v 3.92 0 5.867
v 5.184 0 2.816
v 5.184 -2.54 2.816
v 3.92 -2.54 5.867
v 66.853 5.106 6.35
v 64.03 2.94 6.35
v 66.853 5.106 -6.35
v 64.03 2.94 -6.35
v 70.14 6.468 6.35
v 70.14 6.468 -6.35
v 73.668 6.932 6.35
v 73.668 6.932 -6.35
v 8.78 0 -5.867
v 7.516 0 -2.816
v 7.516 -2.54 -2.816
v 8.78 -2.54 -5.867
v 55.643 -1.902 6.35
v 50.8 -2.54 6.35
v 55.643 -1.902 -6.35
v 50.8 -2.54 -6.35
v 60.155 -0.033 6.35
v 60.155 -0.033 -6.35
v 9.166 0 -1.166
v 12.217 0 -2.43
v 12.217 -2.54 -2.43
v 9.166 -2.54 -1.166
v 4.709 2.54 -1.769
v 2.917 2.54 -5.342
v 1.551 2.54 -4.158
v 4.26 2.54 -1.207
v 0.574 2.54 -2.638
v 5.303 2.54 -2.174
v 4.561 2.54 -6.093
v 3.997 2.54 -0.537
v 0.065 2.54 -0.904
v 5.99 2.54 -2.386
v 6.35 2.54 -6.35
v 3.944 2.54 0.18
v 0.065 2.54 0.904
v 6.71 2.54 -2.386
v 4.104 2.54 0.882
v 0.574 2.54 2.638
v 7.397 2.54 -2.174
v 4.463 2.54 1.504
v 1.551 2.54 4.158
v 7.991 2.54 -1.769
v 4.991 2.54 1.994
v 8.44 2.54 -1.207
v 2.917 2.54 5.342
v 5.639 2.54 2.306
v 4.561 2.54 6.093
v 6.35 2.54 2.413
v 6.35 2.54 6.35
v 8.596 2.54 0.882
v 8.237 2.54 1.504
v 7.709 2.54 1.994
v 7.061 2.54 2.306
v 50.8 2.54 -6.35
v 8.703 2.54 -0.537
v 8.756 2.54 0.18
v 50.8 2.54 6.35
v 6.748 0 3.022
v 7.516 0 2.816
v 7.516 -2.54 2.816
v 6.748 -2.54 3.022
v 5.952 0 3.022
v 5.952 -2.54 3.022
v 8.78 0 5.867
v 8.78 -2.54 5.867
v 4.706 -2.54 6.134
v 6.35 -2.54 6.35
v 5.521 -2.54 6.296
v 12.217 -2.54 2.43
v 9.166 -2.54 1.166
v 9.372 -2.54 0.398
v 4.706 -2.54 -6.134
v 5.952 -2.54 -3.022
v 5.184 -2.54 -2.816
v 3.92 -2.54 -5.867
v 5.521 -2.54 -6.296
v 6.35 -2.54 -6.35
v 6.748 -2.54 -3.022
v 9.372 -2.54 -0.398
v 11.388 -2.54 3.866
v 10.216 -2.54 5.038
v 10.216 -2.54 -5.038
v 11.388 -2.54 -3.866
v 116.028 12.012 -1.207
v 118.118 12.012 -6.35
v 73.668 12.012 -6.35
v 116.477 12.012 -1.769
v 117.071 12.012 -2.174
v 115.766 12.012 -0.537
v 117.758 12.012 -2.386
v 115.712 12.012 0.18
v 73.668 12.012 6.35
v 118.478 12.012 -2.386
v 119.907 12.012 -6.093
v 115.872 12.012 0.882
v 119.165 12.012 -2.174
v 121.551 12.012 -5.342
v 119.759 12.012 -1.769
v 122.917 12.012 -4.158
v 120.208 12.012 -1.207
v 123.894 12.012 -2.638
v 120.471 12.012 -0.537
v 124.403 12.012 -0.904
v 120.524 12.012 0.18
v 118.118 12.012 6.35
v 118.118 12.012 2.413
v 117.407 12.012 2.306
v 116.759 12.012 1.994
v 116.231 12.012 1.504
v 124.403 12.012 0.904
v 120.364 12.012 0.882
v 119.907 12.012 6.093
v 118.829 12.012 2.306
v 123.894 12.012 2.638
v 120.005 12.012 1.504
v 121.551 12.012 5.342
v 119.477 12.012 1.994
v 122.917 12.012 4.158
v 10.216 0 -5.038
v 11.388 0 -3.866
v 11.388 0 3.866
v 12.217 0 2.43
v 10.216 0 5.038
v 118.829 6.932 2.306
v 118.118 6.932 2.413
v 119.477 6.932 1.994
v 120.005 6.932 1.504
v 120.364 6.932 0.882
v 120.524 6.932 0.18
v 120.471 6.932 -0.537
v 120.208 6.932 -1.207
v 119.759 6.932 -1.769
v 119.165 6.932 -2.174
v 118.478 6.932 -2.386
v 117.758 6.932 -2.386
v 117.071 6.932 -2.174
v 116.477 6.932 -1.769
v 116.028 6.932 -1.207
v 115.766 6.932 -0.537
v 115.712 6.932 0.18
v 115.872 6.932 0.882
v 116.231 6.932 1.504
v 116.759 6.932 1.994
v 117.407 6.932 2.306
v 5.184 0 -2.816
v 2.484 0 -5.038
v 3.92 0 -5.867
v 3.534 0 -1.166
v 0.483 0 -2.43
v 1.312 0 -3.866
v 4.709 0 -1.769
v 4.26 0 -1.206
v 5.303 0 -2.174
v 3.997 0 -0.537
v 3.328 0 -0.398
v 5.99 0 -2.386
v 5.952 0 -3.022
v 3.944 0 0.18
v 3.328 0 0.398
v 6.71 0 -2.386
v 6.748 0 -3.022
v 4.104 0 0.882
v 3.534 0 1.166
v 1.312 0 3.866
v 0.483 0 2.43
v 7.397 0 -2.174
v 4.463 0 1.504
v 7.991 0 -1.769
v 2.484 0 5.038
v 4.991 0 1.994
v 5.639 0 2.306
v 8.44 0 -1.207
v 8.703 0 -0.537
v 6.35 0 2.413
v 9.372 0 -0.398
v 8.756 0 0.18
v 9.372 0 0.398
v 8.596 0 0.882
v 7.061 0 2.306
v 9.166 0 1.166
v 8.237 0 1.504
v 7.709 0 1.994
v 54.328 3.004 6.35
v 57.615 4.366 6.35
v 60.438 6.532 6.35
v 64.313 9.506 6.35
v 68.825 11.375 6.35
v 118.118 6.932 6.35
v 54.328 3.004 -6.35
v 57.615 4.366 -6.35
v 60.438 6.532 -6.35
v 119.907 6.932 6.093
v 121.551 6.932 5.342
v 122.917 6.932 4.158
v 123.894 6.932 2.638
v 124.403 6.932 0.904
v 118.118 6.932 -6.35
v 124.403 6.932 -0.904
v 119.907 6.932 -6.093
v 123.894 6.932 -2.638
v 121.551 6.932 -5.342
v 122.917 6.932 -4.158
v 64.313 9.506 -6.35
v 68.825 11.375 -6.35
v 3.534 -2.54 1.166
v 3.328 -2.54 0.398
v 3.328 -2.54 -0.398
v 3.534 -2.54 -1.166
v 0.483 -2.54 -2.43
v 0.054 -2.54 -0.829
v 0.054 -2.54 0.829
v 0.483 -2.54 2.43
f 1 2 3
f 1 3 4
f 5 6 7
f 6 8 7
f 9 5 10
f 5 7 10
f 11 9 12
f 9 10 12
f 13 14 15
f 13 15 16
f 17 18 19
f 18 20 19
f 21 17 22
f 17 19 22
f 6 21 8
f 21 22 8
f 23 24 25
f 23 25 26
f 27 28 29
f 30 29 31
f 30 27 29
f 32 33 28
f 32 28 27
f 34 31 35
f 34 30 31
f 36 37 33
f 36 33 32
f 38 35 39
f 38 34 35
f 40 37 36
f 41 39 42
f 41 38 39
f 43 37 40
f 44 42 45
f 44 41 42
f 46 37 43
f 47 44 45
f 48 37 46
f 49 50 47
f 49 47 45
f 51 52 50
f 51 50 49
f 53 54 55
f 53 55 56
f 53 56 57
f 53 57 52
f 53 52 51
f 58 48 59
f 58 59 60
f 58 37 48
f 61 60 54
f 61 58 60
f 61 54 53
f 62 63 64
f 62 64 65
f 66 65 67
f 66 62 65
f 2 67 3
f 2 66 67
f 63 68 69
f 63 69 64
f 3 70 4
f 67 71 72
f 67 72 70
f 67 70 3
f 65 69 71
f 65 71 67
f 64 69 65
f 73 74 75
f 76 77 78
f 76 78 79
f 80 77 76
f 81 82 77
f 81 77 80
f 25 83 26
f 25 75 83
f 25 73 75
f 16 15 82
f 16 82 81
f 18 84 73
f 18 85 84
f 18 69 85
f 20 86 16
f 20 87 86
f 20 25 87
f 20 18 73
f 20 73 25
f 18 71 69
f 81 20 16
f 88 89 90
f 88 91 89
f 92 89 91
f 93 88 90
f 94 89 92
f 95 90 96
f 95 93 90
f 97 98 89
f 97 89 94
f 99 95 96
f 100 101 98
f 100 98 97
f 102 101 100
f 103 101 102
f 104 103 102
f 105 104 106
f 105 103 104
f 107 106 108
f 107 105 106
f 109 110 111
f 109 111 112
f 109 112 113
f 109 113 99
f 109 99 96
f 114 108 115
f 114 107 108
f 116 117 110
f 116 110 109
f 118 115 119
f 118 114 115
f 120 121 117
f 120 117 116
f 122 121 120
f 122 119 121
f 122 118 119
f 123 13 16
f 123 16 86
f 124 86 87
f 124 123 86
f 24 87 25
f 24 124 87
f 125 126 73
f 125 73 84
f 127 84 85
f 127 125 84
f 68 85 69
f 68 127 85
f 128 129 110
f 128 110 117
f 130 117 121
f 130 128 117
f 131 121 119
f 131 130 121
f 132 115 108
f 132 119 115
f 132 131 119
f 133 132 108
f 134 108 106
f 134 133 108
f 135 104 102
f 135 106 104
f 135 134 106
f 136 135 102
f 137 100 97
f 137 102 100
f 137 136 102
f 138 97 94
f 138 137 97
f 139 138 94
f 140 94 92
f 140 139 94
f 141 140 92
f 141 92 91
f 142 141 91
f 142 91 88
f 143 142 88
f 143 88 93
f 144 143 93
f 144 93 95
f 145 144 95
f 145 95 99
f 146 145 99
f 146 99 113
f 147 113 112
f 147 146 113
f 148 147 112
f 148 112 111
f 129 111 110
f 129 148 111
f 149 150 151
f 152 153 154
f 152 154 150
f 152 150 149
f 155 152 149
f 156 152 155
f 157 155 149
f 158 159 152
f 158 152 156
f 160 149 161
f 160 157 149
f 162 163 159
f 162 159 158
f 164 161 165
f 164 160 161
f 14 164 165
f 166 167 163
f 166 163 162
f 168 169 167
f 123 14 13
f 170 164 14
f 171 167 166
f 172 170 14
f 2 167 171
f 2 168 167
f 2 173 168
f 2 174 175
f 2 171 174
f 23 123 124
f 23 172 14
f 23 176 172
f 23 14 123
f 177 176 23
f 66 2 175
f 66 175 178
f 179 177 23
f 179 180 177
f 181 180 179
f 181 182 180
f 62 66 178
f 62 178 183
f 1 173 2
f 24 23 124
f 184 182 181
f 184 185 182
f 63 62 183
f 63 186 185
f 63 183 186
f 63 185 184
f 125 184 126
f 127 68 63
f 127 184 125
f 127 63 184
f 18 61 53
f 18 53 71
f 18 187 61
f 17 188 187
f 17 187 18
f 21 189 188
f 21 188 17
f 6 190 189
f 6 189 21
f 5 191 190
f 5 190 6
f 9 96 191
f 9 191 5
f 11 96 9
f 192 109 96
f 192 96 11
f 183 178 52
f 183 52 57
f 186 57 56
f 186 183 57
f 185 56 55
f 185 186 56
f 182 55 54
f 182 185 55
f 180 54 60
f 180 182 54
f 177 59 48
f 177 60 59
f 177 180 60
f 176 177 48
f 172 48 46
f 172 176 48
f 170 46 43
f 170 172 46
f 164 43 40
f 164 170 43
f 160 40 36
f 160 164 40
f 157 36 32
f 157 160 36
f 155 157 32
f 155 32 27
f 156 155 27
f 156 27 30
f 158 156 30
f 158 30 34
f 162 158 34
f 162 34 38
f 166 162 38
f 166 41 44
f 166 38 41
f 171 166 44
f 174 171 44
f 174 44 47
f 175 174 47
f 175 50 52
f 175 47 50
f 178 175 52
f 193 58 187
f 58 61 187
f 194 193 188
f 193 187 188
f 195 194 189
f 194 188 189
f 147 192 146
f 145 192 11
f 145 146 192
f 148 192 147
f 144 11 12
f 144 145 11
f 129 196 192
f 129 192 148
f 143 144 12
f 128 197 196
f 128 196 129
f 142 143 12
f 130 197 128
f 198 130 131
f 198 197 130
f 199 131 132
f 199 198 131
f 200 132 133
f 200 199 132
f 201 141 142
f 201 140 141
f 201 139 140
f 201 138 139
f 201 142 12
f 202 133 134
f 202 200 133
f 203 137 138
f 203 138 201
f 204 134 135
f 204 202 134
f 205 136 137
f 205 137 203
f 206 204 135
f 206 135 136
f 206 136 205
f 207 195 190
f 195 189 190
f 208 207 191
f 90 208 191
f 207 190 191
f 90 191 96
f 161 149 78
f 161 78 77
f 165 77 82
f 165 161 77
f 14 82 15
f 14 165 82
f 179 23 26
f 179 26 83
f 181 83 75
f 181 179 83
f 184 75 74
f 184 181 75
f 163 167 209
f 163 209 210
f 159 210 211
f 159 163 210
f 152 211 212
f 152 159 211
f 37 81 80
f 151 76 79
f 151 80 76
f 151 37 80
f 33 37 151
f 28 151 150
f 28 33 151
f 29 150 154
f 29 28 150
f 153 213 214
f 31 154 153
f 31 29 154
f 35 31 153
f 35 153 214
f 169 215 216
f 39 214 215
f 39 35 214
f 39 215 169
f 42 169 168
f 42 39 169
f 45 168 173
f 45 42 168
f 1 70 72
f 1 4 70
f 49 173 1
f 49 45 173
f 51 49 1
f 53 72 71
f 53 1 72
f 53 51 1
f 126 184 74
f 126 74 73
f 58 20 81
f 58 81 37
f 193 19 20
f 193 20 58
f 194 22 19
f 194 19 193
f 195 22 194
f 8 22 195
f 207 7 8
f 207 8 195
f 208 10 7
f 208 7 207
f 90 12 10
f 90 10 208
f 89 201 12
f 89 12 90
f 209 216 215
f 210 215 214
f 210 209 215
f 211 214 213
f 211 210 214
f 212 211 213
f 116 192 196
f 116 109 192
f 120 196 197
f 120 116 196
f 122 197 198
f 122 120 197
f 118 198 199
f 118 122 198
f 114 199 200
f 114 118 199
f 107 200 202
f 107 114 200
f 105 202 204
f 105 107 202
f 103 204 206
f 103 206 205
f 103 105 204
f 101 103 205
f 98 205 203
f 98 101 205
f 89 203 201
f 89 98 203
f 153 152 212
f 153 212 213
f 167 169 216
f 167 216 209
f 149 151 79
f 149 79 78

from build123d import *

# Parameters (mm, degrees)
SKETCH1_W               = 12.7
SKETCH1_H               = 5.08
CUT_EXTRUDE1_DEPTH      = 125.989350007
CUT_EXTRUDE1_DEPTH_BACK = 125.989350007
SKETCH5_R               = 2.413
FILLET1_RADIUS          = 6.35
FILLET1_LENGTH          = 5.08
FILLET2_RADIUS          = 6.35
FILLET2_LENGTH          = 5.08
CUT_EXTRUDE3_START      = -2.54
SKETCH6_R               = 2.413
CUT_EXTRUDE3_DEPTH      = 2.54


with BuildPart() as part:
    # Sweep1: sweep along a path in Sketch3
    with BuildLine(Plane.XY) as sweep1_path:
        Line((0, 0), (50.8, 0))
        ThreePointArc((50.8, 0), (56.988045526, 1.230878785), (62.234017215, 4.736125003))
        ThreePointArc((62.234017215, 4.736125003), (67.479988905, 8.241371221), (73.66803443, 9.472250006))
        Line((73.66803443, 9.472250006), (124.46803443, 9.472250006))
    # Sketch1 → Sweep1 (sweep)
    with BuildSketch(Plane(origin=(0, 0, 0), x_dir=(0, 0, -1), z_dir=(1, 0, 0))):
        Rectangle(SKETCH1_W, SKETCH1_H)
    sweep(path=sweep1_path.line)

    # Sketch5 → Cut-Extrude1 (cut, two sides: drawn at the far end of the back side and taken through both)
    with BuildSketch(Plane(origin=(0, 2.54, 0), x_dir=(1, 0, 0), z_dir=(0, 1, 0)).offset(-CUT_EXTRUDE1_DEPTH_BACK)):
        with Locations(Location((6.35, 0, 0), (0, 0, 270))):
            Circle(SKETCH5_R)
        with Locations(Location((118.11803443, 0, 0), (0, 0, 270))):
            Circle(SKETCH5_R)
    extrude(amount=CUT_EXTRUDE1_DEPTH + CUT_EXTRUDE1_DEPTH_BACK, mode=Mode.SUBTRACT)

    # Fillet1: full round fillet: the end face becomes a half cylinder, R = half its width
    fillet1_face = Plane((0, 0, 0), x_dir=(0, 1, 0), z_dir=(-1, 0, 0))  # on the end face: x along it, z out of the body
    fillet1_slab = fillet1_face.offset(-FILLET1_RADIUS / 2) * Box(FILLET1_LENGTH, 2 * FILLET1_RADIUS, FILLET1_RADIUS, mode=Mode.PRIVATE)  # the body's end, R deep
    fillet1_round = Plane((6.35, 0, 0), x_dir=(-1, 0, 0), z_dir=(0, 1, 0)) * Cylinder(FILLET1_RADIUS, FILLET1_LENGTH, mode=Mode.PRIVATE)  # its axis R under the face
    add(fillet1_slab - fillet1_round, mode=Mode.SUBTRACT)

    # Fillet2: full round fillet: the end face becomes a half cylinder, R = half its width
    fillet2_face = Plane((124.46803443, 9.472250006, 0), x_dir=(0, 1, 0), z_dir=(1, 0, 0))  # on the end face: x along it, z out of the body
    fillet2_slab = fillet2_face.offset(-FILLET2_RADIUS / 2) * Box(FILLET2_LENGTH, 2 * FILLET2_RADIUS, FILLET2_RADIUS, mode=Mode.PRIVATE)  # the body's end, R deep
    fillet2_round = Plane((118.11803443, 9.472250006, 0), x_dir=(1, 0, 0), z_dir=(0, 1, 0)) * Cylinder(FILLET2_RADIUS, FILLET2_LENGTH, mode=Mode.PRIVATE)  # its axis R under the face
    add(fillet2_slab - fillet2_round, mode=Mode.SUBTRACT)

    # Sketch6 → Cut-Extrude3 (cut)
    with BuildSketch(Plane.XZ.offset(2.54).offset(CUT_EXTRUDE3_START)):
        with BuildLine():
            Line((7.516419102, -2.815984815), (8.780039796, -5.866635031))
            ThreePointArc((8.780039796, -5.866635031), (10.840128061, -4.490128061), (12.216635031, -2.430039796))
            Line((12.216635031, -2.430039796), (9.165984815, -1.166419102))
            ThreePointArc((9.165984815, -1.166419102), (9.398, 0), (9.165984815, 1.166419102))
            Line((9.165984815, 1.166419102), (12.216635031, 2.430039796))
            ThreePointArc((12.216635031, 2.430039796), (10.840128061, 4.490128061), (8.780039796, 5.866635031))
            Line((8.780039796, 5.866635031), (7.516419102, 2.815984815))
            ThreePointArc((7.516419102, 2.815984815), (6.35, 3.048), (5.183580898, 2.815984815))
            Line((5.183580898, 2.815984815), (3.919960204, 5.866635031))
            ThreePointArc((3.919960204, 5.866635031), (1.859871939, 4.490128061), (0.483364969, 2.430039796))
            Line((0.483364969, 2.430039796), (3.534015185, 1.166419102))
            ThreePointArc((3.534015185, 1.166419102), (3.302, 0), (3.534015185, -1.166419102))
            Line((3.534015185, -1.166419102), (0.483364969, -2.430039796))
            ThreePointArc((0.483364969, -2.430039796), (1.859871939, -4.490128061), (3.919960204, -5.866635031))
            Line((3.919960204, -5.866635031), (5.183580898, -2.815984815))
            ThreePointArc((5.183580898, -2.815984815), (6.35, -3.048), (7.516419102, -2.815984815))
        make_face()
        with Locations(Location((6.35, 0, 0), (0, 0, 90))):
            Circle(SKETCH6_R, mode=Mode.SUBTRACT)
    extrude(amount=CUT_EXTRUDE3_DEPTH, mode=Mode.SUBTRACT)


solid = part.part
